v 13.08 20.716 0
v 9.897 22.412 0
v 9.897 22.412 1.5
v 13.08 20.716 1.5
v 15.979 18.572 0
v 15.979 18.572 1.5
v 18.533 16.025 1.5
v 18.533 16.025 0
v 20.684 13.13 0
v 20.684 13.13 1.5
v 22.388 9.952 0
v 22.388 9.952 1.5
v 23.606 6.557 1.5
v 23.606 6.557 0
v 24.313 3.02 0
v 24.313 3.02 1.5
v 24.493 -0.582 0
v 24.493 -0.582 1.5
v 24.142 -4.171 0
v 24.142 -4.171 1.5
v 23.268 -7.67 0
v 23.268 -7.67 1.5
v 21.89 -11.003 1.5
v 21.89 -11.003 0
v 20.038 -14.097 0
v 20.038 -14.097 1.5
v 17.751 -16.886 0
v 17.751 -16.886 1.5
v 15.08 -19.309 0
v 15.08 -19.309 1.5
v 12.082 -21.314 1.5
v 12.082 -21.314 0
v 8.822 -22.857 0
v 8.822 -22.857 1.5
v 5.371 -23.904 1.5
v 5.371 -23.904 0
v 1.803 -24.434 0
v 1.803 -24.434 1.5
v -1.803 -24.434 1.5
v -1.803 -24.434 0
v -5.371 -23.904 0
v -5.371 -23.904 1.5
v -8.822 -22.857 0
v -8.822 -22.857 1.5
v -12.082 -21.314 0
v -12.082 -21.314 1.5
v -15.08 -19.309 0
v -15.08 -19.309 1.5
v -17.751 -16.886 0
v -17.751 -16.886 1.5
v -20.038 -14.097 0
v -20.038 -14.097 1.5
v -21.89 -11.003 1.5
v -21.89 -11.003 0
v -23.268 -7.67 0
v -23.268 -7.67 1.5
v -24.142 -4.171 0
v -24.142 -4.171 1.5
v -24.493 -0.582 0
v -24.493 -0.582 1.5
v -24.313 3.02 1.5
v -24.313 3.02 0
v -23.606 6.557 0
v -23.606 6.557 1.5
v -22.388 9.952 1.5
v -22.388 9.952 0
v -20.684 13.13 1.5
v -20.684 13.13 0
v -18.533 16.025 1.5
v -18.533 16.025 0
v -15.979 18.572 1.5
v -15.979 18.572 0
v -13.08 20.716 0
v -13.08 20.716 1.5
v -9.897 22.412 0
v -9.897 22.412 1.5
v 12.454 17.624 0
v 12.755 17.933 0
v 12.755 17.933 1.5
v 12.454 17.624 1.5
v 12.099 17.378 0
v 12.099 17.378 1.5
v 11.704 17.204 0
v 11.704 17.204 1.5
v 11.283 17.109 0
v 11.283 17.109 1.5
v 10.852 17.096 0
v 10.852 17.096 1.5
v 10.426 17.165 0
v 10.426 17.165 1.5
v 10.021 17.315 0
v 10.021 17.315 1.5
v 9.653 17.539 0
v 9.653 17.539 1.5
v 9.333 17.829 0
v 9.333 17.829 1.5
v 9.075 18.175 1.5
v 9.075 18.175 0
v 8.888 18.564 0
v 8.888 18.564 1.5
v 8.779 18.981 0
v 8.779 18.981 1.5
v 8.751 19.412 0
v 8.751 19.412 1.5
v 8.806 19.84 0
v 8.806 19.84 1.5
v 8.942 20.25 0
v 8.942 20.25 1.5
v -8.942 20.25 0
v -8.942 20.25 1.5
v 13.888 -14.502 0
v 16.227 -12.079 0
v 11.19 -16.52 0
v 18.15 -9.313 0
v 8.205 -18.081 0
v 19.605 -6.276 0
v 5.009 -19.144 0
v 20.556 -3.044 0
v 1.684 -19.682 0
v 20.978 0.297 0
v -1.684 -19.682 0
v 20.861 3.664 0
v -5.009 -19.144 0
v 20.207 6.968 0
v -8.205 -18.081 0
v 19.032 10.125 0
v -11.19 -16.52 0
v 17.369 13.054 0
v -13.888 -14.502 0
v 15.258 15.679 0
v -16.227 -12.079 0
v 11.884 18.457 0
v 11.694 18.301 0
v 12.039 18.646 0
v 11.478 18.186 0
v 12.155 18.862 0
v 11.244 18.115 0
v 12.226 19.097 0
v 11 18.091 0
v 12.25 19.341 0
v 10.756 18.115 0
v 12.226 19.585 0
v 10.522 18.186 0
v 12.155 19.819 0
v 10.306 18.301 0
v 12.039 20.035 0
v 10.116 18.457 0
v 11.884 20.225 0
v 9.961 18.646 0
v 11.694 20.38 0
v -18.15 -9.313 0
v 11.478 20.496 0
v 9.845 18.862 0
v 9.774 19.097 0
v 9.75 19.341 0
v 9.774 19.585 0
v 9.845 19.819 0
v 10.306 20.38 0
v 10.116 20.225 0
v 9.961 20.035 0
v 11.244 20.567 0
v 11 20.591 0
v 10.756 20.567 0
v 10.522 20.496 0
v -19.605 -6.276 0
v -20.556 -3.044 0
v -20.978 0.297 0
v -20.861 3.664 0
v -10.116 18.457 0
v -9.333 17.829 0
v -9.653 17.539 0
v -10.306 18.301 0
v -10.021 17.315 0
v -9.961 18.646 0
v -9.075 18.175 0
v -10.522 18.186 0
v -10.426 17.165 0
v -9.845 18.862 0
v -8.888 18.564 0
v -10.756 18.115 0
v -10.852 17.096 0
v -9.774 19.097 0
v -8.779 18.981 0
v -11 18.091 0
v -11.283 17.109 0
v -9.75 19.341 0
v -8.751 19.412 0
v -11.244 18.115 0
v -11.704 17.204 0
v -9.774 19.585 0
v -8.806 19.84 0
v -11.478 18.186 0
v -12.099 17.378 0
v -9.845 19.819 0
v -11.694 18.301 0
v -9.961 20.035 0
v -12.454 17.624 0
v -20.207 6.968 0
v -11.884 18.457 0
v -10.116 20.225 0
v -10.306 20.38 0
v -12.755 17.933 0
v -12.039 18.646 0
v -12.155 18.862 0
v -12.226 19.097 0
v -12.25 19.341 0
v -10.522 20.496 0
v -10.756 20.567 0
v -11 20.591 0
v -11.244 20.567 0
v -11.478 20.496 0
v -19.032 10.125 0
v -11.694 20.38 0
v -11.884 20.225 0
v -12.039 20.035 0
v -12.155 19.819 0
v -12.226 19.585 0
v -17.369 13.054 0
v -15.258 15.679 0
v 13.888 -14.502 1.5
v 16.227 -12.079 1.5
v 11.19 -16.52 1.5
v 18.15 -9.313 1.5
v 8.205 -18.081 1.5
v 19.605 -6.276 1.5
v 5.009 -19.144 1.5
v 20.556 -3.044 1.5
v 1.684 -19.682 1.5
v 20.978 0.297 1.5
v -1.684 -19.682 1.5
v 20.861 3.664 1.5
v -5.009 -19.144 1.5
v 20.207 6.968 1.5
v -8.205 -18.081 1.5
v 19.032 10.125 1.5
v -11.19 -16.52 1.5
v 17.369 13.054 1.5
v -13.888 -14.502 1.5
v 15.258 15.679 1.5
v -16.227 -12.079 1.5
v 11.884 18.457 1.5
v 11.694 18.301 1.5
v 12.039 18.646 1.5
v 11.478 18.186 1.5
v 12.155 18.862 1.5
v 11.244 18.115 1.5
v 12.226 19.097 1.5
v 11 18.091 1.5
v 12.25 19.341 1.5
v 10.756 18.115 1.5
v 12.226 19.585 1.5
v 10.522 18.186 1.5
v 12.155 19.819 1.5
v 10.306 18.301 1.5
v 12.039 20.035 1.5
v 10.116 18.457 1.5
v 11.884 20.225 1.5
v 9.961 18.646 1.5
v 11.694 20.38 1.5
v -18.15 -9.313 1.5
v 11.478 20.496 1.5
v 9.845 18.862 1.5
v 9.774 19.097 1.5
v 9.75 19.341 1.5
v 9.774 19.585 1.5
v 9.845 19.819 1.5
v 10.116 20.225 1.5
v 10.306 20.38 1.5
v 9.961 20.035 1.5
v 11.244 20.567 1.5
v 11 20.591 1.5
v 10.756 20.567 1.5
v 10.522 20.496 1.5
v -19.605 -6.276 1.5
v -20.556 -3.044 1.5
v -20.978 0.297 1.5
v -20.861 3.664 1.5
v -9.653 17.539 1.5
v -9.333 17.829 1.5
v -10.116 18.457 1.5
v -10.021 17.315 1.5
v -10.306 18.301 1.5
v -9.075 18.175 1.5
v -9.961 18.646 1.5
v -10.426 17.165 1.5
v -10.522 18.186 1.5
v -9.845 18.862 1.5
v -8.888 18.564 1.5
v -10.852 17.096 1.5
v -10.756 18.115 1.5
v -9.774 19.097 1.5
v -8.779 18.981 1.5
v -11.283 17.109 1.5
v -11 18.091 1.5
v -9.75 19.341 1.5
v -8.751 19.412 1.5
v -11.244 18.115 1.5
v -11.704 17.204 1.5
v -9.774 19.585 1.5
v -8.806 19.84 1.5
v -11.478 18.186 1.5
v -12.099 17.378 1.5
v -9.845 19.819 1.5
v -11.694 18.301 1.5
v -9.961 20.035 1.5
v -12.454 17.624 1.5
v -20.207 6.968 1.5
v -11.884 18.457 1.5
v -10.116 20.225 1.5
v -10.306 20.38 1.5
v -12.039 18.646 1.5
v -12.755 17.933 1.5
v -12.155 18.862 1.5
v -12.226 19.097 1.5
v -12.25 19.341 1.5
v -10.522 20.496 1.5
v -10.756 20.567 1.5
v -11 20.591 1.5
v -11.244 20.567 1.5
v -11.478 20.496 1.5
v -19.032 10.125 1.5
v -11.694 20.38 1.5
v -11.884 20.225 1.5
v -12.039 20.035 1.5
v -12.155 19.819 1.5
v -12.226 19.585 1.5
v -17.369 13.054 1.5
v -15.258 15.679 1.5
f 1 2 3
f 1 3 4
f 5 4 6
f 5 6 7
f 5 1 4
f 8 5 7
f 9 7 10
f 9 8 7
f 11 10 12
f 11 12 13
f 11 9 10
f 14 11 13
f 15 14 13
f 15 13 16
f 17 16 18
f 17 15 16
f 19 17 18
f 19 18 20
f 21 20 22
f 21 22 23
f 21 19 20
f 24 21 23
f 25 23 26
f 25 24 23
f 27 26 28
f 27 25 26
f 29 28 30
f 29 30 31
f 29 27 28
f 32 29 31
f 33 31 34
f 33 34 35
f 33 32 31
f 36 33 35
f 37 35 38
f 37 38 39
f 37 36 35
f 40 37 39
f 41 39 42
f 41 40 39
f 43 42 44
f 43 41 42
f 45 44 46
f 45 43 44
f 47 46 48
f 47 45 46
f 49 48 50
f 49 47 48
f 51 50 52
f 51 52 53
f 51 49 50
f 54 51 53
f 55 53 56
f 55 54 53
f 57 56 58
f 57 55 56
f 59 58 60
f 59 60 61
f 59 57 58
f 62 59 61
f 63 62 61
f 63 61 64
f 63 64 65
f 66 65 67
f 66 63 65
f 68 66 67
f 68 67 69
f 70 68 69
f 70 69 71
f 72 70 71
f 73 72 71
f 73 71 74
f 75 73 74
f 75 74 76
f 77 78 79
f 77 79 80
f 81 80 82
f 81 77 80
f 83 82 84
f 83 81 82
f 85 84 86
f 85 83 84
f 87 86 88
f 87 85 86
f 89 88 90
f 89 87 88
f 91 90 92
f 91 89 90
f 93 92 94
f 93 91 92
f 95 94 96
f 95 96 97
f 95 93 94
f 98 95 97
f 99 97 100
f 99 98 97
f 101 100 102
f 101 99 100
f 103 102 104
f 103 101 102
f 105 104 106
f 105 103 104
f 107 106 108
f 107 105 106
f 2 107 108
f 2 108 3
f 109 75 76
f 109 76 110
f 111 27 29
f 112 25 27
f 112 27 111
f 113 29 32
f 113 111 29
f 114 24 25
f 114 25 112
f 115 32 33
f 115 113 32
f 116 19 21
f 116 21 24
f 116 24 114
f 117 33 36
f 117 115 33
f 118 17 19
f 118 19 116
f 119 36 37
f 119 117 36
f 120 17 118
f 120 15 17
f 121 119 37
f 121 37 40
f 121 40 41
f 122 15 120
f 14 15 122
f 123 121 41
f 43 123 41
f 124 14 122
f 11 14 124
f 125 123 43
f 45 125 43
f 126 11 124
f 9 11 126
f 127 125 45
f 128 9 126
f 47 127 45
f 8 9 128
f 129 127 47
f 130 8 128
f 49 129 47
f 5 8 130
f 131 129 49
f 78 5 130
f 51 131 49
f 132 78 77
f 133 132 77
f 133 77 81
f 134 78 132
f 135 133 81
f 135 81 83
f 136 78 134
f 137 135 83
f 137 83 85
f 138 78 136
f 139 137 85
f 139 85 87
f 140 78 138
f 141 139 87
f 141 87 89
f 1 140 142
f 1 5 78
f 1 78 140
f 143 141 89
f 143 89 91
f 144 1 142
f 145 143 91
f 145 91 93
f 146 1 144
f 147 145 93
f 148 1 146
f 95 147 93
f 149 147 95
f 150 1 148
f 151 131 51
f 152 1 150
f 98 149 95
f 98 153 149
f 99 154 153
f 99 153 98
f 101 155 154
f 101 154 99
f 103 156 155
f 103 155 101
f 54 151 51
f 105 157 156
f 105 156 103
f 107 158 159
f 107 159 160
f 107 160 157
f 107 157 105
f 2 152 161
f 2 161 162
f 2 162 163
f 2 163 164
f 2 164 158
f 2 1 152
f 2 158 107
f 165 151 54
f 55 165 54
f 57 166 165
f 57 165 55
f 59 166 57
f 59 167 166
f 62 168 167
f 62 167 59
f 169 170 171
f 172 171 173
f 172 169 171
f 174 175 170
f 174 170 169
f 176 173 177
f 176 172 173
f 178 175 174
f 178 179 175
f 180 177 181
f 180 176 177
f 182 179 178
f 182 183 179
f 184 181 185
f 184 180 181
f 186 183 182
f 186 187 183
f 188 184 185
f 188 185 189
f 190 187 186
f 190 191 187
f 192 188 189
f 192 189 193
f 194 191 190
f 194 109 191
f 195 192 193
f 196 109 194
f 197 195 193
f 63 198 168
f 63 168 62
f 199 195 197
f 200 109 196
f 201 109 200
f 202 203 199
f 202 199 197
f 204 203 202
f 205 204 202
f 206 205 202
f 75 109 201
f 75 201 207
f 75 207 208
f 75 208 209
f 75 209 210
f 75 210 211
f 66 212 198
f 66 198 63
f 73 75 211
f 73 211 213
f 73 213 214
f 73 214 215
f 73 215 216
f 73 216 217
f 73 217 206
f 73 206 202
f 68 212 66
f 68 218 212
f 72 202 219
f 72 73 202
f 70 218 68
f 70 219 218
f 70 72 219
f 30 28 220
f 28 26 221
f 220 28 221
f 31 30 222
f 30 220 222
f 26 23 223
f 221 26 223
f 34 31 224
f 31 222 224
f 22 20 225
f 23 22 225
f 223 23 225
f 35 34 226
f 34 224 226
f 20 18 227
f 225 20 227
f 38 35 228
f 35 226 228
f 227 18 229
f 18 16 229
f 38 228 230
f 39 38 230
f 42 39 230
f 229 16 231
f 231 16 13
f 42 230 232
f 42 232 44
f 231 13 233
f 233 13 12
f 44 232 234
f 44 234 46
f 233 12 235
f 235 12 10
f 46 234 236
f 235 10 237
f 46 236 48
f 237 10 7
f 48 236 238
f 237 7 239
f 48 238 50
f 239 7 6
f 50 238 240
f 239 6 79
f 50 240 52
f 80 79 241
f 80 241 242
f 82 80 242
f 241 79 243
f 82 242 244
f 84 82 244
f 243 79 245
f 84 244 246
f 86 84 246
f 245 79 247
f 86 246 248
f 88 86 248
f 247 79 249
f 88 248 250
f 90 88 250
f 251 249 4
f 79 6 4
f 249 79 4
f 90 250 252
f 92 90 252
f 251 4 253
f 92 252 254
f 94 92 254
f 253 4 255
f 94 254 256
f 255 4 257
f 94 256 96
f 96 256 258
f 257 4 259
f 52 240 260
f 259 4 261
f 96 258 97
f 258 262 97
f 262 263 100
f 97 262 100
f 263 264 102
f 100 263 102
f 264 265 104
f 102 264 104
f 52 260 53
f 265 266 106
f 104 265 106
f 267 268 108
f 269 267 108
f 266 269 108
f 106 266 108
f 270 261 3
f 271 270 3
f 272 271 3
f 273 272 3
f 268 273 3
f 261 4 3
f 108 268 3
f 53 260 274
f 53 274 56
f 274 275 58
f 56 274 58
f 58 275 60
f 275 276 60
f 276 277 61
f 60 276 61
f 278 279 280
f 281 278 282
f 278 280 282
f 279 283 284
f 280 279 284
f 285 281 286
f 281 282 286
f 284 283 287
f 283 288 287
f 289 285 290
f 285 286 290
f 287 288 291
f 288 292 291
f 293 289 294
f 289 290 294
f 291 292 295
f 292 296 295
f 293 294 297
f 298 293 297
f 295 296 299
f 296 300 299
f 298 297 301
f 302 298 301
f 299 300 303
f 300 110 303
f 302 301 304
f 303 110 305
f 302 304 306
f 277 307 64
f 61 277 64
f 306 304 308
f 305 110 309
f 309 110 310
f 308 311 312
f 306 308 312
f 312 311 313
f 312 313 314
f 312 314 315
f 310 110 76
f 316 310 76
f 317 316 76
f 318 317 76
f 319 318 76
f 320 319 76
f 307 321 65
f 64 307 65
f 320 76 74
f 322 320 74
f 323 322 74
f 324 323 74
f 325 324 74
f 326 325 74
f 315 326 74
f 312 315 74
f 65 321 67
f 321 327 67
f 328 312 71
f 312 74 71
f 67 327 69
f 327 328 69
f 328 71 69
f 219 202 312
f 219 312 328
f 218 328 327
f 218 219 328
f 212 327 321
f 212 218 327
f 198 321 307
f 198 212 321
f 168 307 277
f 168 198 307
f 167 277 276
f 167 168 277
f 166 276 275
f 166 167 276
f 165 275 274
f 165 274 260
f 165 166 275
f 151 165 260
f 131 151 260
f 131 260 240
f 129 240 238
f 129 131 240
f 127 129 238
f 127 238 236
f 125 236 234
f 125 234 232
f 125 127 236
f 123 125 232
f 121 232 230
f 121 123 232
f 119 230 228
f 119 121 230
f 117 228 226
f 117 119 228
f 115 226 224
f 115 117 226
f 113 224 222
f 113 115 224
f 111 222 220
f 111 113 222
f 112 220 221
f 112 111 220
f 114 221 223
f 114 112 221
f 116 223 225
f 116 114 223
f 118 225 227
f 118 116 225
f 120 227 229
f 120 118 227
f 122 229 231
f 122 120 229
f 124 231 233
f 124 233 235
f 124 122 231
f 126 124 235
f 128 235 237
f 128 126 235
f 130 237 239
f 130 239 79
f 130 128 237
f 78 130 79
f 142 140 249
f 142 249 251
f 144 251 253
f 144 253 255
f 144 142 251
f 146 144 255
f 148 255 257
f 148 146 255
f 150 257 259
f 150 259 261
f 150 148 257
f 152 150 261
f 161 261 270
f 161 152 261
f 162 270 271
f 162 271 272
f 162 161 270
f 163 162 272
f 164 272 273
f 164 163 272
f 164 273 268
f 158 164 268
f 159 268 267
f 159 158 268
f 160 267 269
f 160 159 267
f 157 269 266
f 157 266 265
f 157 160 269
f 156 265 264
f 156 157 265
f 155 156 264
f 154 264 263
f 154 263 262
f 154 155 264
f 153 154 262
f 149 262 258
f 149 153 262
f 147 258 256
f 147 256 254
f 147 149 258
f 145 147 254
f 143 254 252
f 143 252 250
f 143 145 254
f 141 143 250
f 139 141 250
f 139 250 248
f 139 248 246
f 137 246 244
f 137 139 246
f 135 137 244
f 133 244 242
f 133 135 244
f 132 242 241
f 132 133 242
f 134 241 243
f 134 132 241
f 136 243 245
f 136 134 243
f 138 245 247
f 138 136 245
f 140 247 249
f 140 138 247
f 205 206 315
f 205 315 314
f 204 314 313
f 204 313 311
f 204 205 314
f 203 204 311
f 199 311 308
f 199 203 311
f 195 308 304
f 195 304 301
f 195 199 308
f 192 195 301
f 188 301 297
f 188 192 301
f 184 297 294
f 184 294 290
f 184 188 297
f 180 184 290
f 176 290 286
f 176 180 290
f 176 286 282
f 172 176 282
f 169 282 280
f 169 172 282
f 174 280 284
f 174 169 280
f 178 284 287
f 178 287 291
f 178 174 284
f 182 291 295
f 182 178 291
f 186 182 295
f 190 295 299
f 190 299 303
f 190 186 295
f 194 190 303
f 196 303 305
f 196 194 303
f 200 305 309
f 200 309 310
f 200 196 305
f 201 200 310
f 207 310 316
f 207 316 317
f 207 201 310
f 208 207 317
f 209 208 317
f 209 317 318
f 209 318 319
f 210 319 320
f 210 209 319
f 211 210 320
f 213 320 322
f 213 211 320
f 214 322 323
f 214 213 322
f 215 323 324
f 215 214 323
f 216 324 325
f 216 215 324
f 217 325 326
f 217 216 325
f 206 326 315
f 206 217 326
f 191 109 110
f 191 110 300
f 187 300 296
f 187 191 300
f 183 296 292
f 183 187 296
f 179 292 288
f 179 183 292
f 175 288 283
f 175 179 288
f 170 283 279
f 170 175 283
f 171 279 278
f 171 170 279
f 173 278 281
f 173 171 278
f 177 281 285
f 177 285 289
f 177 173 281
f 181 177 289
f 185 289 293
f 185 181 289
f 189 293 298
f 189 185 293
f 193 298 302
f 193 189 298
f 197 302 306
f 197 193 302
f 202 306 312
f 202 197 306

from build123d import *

# Parameters (mm, degrees)
ESQUISSE1_R      = 1.25
EXTRUSION1_DEPTH = 1.5


with BuildPart() as part:
    # Esquisse1 → Extrusion1 (new body)
    with BuildSketch(Plane.XY):
        with BuildLine():
            Line((8.941739228, 20.249575294), (9.896691771, 22.412172853))
            ThreePointArc((9.896691771, 22.412172853), (0, -24.5), (-9.896691771, 22.412172853))
            Line((-9.896691771, 22.412172853), (-8.941739228, 20.249575294))
            ThreePointArc((-8.941739228, 20.249575294), (-9.831654076, 17.417815357), (-12.754966888, 17.93265026))
            ThreePointArc((-12.754966888, 17.93265026), (0, -19.75), (12.754966888, 17.93265026))
            ThreePointArc((12.754966888, 17.93265026), (9.831654076, 17.417815357), (8.941739228, 20.249575294))
        make_face()
        with Locations((11, 19.340695437)):
            Circle(ESQUISSE1_R, mode=Mode.SUBTRACT)
        with Locations((-11, 19.340695437)):
            Circle(ESQUISSE1_R, mode=Mode.SUBTRACT)
    extrude(amount=EXTRUSION1_DEPTH)


solid = part.part
